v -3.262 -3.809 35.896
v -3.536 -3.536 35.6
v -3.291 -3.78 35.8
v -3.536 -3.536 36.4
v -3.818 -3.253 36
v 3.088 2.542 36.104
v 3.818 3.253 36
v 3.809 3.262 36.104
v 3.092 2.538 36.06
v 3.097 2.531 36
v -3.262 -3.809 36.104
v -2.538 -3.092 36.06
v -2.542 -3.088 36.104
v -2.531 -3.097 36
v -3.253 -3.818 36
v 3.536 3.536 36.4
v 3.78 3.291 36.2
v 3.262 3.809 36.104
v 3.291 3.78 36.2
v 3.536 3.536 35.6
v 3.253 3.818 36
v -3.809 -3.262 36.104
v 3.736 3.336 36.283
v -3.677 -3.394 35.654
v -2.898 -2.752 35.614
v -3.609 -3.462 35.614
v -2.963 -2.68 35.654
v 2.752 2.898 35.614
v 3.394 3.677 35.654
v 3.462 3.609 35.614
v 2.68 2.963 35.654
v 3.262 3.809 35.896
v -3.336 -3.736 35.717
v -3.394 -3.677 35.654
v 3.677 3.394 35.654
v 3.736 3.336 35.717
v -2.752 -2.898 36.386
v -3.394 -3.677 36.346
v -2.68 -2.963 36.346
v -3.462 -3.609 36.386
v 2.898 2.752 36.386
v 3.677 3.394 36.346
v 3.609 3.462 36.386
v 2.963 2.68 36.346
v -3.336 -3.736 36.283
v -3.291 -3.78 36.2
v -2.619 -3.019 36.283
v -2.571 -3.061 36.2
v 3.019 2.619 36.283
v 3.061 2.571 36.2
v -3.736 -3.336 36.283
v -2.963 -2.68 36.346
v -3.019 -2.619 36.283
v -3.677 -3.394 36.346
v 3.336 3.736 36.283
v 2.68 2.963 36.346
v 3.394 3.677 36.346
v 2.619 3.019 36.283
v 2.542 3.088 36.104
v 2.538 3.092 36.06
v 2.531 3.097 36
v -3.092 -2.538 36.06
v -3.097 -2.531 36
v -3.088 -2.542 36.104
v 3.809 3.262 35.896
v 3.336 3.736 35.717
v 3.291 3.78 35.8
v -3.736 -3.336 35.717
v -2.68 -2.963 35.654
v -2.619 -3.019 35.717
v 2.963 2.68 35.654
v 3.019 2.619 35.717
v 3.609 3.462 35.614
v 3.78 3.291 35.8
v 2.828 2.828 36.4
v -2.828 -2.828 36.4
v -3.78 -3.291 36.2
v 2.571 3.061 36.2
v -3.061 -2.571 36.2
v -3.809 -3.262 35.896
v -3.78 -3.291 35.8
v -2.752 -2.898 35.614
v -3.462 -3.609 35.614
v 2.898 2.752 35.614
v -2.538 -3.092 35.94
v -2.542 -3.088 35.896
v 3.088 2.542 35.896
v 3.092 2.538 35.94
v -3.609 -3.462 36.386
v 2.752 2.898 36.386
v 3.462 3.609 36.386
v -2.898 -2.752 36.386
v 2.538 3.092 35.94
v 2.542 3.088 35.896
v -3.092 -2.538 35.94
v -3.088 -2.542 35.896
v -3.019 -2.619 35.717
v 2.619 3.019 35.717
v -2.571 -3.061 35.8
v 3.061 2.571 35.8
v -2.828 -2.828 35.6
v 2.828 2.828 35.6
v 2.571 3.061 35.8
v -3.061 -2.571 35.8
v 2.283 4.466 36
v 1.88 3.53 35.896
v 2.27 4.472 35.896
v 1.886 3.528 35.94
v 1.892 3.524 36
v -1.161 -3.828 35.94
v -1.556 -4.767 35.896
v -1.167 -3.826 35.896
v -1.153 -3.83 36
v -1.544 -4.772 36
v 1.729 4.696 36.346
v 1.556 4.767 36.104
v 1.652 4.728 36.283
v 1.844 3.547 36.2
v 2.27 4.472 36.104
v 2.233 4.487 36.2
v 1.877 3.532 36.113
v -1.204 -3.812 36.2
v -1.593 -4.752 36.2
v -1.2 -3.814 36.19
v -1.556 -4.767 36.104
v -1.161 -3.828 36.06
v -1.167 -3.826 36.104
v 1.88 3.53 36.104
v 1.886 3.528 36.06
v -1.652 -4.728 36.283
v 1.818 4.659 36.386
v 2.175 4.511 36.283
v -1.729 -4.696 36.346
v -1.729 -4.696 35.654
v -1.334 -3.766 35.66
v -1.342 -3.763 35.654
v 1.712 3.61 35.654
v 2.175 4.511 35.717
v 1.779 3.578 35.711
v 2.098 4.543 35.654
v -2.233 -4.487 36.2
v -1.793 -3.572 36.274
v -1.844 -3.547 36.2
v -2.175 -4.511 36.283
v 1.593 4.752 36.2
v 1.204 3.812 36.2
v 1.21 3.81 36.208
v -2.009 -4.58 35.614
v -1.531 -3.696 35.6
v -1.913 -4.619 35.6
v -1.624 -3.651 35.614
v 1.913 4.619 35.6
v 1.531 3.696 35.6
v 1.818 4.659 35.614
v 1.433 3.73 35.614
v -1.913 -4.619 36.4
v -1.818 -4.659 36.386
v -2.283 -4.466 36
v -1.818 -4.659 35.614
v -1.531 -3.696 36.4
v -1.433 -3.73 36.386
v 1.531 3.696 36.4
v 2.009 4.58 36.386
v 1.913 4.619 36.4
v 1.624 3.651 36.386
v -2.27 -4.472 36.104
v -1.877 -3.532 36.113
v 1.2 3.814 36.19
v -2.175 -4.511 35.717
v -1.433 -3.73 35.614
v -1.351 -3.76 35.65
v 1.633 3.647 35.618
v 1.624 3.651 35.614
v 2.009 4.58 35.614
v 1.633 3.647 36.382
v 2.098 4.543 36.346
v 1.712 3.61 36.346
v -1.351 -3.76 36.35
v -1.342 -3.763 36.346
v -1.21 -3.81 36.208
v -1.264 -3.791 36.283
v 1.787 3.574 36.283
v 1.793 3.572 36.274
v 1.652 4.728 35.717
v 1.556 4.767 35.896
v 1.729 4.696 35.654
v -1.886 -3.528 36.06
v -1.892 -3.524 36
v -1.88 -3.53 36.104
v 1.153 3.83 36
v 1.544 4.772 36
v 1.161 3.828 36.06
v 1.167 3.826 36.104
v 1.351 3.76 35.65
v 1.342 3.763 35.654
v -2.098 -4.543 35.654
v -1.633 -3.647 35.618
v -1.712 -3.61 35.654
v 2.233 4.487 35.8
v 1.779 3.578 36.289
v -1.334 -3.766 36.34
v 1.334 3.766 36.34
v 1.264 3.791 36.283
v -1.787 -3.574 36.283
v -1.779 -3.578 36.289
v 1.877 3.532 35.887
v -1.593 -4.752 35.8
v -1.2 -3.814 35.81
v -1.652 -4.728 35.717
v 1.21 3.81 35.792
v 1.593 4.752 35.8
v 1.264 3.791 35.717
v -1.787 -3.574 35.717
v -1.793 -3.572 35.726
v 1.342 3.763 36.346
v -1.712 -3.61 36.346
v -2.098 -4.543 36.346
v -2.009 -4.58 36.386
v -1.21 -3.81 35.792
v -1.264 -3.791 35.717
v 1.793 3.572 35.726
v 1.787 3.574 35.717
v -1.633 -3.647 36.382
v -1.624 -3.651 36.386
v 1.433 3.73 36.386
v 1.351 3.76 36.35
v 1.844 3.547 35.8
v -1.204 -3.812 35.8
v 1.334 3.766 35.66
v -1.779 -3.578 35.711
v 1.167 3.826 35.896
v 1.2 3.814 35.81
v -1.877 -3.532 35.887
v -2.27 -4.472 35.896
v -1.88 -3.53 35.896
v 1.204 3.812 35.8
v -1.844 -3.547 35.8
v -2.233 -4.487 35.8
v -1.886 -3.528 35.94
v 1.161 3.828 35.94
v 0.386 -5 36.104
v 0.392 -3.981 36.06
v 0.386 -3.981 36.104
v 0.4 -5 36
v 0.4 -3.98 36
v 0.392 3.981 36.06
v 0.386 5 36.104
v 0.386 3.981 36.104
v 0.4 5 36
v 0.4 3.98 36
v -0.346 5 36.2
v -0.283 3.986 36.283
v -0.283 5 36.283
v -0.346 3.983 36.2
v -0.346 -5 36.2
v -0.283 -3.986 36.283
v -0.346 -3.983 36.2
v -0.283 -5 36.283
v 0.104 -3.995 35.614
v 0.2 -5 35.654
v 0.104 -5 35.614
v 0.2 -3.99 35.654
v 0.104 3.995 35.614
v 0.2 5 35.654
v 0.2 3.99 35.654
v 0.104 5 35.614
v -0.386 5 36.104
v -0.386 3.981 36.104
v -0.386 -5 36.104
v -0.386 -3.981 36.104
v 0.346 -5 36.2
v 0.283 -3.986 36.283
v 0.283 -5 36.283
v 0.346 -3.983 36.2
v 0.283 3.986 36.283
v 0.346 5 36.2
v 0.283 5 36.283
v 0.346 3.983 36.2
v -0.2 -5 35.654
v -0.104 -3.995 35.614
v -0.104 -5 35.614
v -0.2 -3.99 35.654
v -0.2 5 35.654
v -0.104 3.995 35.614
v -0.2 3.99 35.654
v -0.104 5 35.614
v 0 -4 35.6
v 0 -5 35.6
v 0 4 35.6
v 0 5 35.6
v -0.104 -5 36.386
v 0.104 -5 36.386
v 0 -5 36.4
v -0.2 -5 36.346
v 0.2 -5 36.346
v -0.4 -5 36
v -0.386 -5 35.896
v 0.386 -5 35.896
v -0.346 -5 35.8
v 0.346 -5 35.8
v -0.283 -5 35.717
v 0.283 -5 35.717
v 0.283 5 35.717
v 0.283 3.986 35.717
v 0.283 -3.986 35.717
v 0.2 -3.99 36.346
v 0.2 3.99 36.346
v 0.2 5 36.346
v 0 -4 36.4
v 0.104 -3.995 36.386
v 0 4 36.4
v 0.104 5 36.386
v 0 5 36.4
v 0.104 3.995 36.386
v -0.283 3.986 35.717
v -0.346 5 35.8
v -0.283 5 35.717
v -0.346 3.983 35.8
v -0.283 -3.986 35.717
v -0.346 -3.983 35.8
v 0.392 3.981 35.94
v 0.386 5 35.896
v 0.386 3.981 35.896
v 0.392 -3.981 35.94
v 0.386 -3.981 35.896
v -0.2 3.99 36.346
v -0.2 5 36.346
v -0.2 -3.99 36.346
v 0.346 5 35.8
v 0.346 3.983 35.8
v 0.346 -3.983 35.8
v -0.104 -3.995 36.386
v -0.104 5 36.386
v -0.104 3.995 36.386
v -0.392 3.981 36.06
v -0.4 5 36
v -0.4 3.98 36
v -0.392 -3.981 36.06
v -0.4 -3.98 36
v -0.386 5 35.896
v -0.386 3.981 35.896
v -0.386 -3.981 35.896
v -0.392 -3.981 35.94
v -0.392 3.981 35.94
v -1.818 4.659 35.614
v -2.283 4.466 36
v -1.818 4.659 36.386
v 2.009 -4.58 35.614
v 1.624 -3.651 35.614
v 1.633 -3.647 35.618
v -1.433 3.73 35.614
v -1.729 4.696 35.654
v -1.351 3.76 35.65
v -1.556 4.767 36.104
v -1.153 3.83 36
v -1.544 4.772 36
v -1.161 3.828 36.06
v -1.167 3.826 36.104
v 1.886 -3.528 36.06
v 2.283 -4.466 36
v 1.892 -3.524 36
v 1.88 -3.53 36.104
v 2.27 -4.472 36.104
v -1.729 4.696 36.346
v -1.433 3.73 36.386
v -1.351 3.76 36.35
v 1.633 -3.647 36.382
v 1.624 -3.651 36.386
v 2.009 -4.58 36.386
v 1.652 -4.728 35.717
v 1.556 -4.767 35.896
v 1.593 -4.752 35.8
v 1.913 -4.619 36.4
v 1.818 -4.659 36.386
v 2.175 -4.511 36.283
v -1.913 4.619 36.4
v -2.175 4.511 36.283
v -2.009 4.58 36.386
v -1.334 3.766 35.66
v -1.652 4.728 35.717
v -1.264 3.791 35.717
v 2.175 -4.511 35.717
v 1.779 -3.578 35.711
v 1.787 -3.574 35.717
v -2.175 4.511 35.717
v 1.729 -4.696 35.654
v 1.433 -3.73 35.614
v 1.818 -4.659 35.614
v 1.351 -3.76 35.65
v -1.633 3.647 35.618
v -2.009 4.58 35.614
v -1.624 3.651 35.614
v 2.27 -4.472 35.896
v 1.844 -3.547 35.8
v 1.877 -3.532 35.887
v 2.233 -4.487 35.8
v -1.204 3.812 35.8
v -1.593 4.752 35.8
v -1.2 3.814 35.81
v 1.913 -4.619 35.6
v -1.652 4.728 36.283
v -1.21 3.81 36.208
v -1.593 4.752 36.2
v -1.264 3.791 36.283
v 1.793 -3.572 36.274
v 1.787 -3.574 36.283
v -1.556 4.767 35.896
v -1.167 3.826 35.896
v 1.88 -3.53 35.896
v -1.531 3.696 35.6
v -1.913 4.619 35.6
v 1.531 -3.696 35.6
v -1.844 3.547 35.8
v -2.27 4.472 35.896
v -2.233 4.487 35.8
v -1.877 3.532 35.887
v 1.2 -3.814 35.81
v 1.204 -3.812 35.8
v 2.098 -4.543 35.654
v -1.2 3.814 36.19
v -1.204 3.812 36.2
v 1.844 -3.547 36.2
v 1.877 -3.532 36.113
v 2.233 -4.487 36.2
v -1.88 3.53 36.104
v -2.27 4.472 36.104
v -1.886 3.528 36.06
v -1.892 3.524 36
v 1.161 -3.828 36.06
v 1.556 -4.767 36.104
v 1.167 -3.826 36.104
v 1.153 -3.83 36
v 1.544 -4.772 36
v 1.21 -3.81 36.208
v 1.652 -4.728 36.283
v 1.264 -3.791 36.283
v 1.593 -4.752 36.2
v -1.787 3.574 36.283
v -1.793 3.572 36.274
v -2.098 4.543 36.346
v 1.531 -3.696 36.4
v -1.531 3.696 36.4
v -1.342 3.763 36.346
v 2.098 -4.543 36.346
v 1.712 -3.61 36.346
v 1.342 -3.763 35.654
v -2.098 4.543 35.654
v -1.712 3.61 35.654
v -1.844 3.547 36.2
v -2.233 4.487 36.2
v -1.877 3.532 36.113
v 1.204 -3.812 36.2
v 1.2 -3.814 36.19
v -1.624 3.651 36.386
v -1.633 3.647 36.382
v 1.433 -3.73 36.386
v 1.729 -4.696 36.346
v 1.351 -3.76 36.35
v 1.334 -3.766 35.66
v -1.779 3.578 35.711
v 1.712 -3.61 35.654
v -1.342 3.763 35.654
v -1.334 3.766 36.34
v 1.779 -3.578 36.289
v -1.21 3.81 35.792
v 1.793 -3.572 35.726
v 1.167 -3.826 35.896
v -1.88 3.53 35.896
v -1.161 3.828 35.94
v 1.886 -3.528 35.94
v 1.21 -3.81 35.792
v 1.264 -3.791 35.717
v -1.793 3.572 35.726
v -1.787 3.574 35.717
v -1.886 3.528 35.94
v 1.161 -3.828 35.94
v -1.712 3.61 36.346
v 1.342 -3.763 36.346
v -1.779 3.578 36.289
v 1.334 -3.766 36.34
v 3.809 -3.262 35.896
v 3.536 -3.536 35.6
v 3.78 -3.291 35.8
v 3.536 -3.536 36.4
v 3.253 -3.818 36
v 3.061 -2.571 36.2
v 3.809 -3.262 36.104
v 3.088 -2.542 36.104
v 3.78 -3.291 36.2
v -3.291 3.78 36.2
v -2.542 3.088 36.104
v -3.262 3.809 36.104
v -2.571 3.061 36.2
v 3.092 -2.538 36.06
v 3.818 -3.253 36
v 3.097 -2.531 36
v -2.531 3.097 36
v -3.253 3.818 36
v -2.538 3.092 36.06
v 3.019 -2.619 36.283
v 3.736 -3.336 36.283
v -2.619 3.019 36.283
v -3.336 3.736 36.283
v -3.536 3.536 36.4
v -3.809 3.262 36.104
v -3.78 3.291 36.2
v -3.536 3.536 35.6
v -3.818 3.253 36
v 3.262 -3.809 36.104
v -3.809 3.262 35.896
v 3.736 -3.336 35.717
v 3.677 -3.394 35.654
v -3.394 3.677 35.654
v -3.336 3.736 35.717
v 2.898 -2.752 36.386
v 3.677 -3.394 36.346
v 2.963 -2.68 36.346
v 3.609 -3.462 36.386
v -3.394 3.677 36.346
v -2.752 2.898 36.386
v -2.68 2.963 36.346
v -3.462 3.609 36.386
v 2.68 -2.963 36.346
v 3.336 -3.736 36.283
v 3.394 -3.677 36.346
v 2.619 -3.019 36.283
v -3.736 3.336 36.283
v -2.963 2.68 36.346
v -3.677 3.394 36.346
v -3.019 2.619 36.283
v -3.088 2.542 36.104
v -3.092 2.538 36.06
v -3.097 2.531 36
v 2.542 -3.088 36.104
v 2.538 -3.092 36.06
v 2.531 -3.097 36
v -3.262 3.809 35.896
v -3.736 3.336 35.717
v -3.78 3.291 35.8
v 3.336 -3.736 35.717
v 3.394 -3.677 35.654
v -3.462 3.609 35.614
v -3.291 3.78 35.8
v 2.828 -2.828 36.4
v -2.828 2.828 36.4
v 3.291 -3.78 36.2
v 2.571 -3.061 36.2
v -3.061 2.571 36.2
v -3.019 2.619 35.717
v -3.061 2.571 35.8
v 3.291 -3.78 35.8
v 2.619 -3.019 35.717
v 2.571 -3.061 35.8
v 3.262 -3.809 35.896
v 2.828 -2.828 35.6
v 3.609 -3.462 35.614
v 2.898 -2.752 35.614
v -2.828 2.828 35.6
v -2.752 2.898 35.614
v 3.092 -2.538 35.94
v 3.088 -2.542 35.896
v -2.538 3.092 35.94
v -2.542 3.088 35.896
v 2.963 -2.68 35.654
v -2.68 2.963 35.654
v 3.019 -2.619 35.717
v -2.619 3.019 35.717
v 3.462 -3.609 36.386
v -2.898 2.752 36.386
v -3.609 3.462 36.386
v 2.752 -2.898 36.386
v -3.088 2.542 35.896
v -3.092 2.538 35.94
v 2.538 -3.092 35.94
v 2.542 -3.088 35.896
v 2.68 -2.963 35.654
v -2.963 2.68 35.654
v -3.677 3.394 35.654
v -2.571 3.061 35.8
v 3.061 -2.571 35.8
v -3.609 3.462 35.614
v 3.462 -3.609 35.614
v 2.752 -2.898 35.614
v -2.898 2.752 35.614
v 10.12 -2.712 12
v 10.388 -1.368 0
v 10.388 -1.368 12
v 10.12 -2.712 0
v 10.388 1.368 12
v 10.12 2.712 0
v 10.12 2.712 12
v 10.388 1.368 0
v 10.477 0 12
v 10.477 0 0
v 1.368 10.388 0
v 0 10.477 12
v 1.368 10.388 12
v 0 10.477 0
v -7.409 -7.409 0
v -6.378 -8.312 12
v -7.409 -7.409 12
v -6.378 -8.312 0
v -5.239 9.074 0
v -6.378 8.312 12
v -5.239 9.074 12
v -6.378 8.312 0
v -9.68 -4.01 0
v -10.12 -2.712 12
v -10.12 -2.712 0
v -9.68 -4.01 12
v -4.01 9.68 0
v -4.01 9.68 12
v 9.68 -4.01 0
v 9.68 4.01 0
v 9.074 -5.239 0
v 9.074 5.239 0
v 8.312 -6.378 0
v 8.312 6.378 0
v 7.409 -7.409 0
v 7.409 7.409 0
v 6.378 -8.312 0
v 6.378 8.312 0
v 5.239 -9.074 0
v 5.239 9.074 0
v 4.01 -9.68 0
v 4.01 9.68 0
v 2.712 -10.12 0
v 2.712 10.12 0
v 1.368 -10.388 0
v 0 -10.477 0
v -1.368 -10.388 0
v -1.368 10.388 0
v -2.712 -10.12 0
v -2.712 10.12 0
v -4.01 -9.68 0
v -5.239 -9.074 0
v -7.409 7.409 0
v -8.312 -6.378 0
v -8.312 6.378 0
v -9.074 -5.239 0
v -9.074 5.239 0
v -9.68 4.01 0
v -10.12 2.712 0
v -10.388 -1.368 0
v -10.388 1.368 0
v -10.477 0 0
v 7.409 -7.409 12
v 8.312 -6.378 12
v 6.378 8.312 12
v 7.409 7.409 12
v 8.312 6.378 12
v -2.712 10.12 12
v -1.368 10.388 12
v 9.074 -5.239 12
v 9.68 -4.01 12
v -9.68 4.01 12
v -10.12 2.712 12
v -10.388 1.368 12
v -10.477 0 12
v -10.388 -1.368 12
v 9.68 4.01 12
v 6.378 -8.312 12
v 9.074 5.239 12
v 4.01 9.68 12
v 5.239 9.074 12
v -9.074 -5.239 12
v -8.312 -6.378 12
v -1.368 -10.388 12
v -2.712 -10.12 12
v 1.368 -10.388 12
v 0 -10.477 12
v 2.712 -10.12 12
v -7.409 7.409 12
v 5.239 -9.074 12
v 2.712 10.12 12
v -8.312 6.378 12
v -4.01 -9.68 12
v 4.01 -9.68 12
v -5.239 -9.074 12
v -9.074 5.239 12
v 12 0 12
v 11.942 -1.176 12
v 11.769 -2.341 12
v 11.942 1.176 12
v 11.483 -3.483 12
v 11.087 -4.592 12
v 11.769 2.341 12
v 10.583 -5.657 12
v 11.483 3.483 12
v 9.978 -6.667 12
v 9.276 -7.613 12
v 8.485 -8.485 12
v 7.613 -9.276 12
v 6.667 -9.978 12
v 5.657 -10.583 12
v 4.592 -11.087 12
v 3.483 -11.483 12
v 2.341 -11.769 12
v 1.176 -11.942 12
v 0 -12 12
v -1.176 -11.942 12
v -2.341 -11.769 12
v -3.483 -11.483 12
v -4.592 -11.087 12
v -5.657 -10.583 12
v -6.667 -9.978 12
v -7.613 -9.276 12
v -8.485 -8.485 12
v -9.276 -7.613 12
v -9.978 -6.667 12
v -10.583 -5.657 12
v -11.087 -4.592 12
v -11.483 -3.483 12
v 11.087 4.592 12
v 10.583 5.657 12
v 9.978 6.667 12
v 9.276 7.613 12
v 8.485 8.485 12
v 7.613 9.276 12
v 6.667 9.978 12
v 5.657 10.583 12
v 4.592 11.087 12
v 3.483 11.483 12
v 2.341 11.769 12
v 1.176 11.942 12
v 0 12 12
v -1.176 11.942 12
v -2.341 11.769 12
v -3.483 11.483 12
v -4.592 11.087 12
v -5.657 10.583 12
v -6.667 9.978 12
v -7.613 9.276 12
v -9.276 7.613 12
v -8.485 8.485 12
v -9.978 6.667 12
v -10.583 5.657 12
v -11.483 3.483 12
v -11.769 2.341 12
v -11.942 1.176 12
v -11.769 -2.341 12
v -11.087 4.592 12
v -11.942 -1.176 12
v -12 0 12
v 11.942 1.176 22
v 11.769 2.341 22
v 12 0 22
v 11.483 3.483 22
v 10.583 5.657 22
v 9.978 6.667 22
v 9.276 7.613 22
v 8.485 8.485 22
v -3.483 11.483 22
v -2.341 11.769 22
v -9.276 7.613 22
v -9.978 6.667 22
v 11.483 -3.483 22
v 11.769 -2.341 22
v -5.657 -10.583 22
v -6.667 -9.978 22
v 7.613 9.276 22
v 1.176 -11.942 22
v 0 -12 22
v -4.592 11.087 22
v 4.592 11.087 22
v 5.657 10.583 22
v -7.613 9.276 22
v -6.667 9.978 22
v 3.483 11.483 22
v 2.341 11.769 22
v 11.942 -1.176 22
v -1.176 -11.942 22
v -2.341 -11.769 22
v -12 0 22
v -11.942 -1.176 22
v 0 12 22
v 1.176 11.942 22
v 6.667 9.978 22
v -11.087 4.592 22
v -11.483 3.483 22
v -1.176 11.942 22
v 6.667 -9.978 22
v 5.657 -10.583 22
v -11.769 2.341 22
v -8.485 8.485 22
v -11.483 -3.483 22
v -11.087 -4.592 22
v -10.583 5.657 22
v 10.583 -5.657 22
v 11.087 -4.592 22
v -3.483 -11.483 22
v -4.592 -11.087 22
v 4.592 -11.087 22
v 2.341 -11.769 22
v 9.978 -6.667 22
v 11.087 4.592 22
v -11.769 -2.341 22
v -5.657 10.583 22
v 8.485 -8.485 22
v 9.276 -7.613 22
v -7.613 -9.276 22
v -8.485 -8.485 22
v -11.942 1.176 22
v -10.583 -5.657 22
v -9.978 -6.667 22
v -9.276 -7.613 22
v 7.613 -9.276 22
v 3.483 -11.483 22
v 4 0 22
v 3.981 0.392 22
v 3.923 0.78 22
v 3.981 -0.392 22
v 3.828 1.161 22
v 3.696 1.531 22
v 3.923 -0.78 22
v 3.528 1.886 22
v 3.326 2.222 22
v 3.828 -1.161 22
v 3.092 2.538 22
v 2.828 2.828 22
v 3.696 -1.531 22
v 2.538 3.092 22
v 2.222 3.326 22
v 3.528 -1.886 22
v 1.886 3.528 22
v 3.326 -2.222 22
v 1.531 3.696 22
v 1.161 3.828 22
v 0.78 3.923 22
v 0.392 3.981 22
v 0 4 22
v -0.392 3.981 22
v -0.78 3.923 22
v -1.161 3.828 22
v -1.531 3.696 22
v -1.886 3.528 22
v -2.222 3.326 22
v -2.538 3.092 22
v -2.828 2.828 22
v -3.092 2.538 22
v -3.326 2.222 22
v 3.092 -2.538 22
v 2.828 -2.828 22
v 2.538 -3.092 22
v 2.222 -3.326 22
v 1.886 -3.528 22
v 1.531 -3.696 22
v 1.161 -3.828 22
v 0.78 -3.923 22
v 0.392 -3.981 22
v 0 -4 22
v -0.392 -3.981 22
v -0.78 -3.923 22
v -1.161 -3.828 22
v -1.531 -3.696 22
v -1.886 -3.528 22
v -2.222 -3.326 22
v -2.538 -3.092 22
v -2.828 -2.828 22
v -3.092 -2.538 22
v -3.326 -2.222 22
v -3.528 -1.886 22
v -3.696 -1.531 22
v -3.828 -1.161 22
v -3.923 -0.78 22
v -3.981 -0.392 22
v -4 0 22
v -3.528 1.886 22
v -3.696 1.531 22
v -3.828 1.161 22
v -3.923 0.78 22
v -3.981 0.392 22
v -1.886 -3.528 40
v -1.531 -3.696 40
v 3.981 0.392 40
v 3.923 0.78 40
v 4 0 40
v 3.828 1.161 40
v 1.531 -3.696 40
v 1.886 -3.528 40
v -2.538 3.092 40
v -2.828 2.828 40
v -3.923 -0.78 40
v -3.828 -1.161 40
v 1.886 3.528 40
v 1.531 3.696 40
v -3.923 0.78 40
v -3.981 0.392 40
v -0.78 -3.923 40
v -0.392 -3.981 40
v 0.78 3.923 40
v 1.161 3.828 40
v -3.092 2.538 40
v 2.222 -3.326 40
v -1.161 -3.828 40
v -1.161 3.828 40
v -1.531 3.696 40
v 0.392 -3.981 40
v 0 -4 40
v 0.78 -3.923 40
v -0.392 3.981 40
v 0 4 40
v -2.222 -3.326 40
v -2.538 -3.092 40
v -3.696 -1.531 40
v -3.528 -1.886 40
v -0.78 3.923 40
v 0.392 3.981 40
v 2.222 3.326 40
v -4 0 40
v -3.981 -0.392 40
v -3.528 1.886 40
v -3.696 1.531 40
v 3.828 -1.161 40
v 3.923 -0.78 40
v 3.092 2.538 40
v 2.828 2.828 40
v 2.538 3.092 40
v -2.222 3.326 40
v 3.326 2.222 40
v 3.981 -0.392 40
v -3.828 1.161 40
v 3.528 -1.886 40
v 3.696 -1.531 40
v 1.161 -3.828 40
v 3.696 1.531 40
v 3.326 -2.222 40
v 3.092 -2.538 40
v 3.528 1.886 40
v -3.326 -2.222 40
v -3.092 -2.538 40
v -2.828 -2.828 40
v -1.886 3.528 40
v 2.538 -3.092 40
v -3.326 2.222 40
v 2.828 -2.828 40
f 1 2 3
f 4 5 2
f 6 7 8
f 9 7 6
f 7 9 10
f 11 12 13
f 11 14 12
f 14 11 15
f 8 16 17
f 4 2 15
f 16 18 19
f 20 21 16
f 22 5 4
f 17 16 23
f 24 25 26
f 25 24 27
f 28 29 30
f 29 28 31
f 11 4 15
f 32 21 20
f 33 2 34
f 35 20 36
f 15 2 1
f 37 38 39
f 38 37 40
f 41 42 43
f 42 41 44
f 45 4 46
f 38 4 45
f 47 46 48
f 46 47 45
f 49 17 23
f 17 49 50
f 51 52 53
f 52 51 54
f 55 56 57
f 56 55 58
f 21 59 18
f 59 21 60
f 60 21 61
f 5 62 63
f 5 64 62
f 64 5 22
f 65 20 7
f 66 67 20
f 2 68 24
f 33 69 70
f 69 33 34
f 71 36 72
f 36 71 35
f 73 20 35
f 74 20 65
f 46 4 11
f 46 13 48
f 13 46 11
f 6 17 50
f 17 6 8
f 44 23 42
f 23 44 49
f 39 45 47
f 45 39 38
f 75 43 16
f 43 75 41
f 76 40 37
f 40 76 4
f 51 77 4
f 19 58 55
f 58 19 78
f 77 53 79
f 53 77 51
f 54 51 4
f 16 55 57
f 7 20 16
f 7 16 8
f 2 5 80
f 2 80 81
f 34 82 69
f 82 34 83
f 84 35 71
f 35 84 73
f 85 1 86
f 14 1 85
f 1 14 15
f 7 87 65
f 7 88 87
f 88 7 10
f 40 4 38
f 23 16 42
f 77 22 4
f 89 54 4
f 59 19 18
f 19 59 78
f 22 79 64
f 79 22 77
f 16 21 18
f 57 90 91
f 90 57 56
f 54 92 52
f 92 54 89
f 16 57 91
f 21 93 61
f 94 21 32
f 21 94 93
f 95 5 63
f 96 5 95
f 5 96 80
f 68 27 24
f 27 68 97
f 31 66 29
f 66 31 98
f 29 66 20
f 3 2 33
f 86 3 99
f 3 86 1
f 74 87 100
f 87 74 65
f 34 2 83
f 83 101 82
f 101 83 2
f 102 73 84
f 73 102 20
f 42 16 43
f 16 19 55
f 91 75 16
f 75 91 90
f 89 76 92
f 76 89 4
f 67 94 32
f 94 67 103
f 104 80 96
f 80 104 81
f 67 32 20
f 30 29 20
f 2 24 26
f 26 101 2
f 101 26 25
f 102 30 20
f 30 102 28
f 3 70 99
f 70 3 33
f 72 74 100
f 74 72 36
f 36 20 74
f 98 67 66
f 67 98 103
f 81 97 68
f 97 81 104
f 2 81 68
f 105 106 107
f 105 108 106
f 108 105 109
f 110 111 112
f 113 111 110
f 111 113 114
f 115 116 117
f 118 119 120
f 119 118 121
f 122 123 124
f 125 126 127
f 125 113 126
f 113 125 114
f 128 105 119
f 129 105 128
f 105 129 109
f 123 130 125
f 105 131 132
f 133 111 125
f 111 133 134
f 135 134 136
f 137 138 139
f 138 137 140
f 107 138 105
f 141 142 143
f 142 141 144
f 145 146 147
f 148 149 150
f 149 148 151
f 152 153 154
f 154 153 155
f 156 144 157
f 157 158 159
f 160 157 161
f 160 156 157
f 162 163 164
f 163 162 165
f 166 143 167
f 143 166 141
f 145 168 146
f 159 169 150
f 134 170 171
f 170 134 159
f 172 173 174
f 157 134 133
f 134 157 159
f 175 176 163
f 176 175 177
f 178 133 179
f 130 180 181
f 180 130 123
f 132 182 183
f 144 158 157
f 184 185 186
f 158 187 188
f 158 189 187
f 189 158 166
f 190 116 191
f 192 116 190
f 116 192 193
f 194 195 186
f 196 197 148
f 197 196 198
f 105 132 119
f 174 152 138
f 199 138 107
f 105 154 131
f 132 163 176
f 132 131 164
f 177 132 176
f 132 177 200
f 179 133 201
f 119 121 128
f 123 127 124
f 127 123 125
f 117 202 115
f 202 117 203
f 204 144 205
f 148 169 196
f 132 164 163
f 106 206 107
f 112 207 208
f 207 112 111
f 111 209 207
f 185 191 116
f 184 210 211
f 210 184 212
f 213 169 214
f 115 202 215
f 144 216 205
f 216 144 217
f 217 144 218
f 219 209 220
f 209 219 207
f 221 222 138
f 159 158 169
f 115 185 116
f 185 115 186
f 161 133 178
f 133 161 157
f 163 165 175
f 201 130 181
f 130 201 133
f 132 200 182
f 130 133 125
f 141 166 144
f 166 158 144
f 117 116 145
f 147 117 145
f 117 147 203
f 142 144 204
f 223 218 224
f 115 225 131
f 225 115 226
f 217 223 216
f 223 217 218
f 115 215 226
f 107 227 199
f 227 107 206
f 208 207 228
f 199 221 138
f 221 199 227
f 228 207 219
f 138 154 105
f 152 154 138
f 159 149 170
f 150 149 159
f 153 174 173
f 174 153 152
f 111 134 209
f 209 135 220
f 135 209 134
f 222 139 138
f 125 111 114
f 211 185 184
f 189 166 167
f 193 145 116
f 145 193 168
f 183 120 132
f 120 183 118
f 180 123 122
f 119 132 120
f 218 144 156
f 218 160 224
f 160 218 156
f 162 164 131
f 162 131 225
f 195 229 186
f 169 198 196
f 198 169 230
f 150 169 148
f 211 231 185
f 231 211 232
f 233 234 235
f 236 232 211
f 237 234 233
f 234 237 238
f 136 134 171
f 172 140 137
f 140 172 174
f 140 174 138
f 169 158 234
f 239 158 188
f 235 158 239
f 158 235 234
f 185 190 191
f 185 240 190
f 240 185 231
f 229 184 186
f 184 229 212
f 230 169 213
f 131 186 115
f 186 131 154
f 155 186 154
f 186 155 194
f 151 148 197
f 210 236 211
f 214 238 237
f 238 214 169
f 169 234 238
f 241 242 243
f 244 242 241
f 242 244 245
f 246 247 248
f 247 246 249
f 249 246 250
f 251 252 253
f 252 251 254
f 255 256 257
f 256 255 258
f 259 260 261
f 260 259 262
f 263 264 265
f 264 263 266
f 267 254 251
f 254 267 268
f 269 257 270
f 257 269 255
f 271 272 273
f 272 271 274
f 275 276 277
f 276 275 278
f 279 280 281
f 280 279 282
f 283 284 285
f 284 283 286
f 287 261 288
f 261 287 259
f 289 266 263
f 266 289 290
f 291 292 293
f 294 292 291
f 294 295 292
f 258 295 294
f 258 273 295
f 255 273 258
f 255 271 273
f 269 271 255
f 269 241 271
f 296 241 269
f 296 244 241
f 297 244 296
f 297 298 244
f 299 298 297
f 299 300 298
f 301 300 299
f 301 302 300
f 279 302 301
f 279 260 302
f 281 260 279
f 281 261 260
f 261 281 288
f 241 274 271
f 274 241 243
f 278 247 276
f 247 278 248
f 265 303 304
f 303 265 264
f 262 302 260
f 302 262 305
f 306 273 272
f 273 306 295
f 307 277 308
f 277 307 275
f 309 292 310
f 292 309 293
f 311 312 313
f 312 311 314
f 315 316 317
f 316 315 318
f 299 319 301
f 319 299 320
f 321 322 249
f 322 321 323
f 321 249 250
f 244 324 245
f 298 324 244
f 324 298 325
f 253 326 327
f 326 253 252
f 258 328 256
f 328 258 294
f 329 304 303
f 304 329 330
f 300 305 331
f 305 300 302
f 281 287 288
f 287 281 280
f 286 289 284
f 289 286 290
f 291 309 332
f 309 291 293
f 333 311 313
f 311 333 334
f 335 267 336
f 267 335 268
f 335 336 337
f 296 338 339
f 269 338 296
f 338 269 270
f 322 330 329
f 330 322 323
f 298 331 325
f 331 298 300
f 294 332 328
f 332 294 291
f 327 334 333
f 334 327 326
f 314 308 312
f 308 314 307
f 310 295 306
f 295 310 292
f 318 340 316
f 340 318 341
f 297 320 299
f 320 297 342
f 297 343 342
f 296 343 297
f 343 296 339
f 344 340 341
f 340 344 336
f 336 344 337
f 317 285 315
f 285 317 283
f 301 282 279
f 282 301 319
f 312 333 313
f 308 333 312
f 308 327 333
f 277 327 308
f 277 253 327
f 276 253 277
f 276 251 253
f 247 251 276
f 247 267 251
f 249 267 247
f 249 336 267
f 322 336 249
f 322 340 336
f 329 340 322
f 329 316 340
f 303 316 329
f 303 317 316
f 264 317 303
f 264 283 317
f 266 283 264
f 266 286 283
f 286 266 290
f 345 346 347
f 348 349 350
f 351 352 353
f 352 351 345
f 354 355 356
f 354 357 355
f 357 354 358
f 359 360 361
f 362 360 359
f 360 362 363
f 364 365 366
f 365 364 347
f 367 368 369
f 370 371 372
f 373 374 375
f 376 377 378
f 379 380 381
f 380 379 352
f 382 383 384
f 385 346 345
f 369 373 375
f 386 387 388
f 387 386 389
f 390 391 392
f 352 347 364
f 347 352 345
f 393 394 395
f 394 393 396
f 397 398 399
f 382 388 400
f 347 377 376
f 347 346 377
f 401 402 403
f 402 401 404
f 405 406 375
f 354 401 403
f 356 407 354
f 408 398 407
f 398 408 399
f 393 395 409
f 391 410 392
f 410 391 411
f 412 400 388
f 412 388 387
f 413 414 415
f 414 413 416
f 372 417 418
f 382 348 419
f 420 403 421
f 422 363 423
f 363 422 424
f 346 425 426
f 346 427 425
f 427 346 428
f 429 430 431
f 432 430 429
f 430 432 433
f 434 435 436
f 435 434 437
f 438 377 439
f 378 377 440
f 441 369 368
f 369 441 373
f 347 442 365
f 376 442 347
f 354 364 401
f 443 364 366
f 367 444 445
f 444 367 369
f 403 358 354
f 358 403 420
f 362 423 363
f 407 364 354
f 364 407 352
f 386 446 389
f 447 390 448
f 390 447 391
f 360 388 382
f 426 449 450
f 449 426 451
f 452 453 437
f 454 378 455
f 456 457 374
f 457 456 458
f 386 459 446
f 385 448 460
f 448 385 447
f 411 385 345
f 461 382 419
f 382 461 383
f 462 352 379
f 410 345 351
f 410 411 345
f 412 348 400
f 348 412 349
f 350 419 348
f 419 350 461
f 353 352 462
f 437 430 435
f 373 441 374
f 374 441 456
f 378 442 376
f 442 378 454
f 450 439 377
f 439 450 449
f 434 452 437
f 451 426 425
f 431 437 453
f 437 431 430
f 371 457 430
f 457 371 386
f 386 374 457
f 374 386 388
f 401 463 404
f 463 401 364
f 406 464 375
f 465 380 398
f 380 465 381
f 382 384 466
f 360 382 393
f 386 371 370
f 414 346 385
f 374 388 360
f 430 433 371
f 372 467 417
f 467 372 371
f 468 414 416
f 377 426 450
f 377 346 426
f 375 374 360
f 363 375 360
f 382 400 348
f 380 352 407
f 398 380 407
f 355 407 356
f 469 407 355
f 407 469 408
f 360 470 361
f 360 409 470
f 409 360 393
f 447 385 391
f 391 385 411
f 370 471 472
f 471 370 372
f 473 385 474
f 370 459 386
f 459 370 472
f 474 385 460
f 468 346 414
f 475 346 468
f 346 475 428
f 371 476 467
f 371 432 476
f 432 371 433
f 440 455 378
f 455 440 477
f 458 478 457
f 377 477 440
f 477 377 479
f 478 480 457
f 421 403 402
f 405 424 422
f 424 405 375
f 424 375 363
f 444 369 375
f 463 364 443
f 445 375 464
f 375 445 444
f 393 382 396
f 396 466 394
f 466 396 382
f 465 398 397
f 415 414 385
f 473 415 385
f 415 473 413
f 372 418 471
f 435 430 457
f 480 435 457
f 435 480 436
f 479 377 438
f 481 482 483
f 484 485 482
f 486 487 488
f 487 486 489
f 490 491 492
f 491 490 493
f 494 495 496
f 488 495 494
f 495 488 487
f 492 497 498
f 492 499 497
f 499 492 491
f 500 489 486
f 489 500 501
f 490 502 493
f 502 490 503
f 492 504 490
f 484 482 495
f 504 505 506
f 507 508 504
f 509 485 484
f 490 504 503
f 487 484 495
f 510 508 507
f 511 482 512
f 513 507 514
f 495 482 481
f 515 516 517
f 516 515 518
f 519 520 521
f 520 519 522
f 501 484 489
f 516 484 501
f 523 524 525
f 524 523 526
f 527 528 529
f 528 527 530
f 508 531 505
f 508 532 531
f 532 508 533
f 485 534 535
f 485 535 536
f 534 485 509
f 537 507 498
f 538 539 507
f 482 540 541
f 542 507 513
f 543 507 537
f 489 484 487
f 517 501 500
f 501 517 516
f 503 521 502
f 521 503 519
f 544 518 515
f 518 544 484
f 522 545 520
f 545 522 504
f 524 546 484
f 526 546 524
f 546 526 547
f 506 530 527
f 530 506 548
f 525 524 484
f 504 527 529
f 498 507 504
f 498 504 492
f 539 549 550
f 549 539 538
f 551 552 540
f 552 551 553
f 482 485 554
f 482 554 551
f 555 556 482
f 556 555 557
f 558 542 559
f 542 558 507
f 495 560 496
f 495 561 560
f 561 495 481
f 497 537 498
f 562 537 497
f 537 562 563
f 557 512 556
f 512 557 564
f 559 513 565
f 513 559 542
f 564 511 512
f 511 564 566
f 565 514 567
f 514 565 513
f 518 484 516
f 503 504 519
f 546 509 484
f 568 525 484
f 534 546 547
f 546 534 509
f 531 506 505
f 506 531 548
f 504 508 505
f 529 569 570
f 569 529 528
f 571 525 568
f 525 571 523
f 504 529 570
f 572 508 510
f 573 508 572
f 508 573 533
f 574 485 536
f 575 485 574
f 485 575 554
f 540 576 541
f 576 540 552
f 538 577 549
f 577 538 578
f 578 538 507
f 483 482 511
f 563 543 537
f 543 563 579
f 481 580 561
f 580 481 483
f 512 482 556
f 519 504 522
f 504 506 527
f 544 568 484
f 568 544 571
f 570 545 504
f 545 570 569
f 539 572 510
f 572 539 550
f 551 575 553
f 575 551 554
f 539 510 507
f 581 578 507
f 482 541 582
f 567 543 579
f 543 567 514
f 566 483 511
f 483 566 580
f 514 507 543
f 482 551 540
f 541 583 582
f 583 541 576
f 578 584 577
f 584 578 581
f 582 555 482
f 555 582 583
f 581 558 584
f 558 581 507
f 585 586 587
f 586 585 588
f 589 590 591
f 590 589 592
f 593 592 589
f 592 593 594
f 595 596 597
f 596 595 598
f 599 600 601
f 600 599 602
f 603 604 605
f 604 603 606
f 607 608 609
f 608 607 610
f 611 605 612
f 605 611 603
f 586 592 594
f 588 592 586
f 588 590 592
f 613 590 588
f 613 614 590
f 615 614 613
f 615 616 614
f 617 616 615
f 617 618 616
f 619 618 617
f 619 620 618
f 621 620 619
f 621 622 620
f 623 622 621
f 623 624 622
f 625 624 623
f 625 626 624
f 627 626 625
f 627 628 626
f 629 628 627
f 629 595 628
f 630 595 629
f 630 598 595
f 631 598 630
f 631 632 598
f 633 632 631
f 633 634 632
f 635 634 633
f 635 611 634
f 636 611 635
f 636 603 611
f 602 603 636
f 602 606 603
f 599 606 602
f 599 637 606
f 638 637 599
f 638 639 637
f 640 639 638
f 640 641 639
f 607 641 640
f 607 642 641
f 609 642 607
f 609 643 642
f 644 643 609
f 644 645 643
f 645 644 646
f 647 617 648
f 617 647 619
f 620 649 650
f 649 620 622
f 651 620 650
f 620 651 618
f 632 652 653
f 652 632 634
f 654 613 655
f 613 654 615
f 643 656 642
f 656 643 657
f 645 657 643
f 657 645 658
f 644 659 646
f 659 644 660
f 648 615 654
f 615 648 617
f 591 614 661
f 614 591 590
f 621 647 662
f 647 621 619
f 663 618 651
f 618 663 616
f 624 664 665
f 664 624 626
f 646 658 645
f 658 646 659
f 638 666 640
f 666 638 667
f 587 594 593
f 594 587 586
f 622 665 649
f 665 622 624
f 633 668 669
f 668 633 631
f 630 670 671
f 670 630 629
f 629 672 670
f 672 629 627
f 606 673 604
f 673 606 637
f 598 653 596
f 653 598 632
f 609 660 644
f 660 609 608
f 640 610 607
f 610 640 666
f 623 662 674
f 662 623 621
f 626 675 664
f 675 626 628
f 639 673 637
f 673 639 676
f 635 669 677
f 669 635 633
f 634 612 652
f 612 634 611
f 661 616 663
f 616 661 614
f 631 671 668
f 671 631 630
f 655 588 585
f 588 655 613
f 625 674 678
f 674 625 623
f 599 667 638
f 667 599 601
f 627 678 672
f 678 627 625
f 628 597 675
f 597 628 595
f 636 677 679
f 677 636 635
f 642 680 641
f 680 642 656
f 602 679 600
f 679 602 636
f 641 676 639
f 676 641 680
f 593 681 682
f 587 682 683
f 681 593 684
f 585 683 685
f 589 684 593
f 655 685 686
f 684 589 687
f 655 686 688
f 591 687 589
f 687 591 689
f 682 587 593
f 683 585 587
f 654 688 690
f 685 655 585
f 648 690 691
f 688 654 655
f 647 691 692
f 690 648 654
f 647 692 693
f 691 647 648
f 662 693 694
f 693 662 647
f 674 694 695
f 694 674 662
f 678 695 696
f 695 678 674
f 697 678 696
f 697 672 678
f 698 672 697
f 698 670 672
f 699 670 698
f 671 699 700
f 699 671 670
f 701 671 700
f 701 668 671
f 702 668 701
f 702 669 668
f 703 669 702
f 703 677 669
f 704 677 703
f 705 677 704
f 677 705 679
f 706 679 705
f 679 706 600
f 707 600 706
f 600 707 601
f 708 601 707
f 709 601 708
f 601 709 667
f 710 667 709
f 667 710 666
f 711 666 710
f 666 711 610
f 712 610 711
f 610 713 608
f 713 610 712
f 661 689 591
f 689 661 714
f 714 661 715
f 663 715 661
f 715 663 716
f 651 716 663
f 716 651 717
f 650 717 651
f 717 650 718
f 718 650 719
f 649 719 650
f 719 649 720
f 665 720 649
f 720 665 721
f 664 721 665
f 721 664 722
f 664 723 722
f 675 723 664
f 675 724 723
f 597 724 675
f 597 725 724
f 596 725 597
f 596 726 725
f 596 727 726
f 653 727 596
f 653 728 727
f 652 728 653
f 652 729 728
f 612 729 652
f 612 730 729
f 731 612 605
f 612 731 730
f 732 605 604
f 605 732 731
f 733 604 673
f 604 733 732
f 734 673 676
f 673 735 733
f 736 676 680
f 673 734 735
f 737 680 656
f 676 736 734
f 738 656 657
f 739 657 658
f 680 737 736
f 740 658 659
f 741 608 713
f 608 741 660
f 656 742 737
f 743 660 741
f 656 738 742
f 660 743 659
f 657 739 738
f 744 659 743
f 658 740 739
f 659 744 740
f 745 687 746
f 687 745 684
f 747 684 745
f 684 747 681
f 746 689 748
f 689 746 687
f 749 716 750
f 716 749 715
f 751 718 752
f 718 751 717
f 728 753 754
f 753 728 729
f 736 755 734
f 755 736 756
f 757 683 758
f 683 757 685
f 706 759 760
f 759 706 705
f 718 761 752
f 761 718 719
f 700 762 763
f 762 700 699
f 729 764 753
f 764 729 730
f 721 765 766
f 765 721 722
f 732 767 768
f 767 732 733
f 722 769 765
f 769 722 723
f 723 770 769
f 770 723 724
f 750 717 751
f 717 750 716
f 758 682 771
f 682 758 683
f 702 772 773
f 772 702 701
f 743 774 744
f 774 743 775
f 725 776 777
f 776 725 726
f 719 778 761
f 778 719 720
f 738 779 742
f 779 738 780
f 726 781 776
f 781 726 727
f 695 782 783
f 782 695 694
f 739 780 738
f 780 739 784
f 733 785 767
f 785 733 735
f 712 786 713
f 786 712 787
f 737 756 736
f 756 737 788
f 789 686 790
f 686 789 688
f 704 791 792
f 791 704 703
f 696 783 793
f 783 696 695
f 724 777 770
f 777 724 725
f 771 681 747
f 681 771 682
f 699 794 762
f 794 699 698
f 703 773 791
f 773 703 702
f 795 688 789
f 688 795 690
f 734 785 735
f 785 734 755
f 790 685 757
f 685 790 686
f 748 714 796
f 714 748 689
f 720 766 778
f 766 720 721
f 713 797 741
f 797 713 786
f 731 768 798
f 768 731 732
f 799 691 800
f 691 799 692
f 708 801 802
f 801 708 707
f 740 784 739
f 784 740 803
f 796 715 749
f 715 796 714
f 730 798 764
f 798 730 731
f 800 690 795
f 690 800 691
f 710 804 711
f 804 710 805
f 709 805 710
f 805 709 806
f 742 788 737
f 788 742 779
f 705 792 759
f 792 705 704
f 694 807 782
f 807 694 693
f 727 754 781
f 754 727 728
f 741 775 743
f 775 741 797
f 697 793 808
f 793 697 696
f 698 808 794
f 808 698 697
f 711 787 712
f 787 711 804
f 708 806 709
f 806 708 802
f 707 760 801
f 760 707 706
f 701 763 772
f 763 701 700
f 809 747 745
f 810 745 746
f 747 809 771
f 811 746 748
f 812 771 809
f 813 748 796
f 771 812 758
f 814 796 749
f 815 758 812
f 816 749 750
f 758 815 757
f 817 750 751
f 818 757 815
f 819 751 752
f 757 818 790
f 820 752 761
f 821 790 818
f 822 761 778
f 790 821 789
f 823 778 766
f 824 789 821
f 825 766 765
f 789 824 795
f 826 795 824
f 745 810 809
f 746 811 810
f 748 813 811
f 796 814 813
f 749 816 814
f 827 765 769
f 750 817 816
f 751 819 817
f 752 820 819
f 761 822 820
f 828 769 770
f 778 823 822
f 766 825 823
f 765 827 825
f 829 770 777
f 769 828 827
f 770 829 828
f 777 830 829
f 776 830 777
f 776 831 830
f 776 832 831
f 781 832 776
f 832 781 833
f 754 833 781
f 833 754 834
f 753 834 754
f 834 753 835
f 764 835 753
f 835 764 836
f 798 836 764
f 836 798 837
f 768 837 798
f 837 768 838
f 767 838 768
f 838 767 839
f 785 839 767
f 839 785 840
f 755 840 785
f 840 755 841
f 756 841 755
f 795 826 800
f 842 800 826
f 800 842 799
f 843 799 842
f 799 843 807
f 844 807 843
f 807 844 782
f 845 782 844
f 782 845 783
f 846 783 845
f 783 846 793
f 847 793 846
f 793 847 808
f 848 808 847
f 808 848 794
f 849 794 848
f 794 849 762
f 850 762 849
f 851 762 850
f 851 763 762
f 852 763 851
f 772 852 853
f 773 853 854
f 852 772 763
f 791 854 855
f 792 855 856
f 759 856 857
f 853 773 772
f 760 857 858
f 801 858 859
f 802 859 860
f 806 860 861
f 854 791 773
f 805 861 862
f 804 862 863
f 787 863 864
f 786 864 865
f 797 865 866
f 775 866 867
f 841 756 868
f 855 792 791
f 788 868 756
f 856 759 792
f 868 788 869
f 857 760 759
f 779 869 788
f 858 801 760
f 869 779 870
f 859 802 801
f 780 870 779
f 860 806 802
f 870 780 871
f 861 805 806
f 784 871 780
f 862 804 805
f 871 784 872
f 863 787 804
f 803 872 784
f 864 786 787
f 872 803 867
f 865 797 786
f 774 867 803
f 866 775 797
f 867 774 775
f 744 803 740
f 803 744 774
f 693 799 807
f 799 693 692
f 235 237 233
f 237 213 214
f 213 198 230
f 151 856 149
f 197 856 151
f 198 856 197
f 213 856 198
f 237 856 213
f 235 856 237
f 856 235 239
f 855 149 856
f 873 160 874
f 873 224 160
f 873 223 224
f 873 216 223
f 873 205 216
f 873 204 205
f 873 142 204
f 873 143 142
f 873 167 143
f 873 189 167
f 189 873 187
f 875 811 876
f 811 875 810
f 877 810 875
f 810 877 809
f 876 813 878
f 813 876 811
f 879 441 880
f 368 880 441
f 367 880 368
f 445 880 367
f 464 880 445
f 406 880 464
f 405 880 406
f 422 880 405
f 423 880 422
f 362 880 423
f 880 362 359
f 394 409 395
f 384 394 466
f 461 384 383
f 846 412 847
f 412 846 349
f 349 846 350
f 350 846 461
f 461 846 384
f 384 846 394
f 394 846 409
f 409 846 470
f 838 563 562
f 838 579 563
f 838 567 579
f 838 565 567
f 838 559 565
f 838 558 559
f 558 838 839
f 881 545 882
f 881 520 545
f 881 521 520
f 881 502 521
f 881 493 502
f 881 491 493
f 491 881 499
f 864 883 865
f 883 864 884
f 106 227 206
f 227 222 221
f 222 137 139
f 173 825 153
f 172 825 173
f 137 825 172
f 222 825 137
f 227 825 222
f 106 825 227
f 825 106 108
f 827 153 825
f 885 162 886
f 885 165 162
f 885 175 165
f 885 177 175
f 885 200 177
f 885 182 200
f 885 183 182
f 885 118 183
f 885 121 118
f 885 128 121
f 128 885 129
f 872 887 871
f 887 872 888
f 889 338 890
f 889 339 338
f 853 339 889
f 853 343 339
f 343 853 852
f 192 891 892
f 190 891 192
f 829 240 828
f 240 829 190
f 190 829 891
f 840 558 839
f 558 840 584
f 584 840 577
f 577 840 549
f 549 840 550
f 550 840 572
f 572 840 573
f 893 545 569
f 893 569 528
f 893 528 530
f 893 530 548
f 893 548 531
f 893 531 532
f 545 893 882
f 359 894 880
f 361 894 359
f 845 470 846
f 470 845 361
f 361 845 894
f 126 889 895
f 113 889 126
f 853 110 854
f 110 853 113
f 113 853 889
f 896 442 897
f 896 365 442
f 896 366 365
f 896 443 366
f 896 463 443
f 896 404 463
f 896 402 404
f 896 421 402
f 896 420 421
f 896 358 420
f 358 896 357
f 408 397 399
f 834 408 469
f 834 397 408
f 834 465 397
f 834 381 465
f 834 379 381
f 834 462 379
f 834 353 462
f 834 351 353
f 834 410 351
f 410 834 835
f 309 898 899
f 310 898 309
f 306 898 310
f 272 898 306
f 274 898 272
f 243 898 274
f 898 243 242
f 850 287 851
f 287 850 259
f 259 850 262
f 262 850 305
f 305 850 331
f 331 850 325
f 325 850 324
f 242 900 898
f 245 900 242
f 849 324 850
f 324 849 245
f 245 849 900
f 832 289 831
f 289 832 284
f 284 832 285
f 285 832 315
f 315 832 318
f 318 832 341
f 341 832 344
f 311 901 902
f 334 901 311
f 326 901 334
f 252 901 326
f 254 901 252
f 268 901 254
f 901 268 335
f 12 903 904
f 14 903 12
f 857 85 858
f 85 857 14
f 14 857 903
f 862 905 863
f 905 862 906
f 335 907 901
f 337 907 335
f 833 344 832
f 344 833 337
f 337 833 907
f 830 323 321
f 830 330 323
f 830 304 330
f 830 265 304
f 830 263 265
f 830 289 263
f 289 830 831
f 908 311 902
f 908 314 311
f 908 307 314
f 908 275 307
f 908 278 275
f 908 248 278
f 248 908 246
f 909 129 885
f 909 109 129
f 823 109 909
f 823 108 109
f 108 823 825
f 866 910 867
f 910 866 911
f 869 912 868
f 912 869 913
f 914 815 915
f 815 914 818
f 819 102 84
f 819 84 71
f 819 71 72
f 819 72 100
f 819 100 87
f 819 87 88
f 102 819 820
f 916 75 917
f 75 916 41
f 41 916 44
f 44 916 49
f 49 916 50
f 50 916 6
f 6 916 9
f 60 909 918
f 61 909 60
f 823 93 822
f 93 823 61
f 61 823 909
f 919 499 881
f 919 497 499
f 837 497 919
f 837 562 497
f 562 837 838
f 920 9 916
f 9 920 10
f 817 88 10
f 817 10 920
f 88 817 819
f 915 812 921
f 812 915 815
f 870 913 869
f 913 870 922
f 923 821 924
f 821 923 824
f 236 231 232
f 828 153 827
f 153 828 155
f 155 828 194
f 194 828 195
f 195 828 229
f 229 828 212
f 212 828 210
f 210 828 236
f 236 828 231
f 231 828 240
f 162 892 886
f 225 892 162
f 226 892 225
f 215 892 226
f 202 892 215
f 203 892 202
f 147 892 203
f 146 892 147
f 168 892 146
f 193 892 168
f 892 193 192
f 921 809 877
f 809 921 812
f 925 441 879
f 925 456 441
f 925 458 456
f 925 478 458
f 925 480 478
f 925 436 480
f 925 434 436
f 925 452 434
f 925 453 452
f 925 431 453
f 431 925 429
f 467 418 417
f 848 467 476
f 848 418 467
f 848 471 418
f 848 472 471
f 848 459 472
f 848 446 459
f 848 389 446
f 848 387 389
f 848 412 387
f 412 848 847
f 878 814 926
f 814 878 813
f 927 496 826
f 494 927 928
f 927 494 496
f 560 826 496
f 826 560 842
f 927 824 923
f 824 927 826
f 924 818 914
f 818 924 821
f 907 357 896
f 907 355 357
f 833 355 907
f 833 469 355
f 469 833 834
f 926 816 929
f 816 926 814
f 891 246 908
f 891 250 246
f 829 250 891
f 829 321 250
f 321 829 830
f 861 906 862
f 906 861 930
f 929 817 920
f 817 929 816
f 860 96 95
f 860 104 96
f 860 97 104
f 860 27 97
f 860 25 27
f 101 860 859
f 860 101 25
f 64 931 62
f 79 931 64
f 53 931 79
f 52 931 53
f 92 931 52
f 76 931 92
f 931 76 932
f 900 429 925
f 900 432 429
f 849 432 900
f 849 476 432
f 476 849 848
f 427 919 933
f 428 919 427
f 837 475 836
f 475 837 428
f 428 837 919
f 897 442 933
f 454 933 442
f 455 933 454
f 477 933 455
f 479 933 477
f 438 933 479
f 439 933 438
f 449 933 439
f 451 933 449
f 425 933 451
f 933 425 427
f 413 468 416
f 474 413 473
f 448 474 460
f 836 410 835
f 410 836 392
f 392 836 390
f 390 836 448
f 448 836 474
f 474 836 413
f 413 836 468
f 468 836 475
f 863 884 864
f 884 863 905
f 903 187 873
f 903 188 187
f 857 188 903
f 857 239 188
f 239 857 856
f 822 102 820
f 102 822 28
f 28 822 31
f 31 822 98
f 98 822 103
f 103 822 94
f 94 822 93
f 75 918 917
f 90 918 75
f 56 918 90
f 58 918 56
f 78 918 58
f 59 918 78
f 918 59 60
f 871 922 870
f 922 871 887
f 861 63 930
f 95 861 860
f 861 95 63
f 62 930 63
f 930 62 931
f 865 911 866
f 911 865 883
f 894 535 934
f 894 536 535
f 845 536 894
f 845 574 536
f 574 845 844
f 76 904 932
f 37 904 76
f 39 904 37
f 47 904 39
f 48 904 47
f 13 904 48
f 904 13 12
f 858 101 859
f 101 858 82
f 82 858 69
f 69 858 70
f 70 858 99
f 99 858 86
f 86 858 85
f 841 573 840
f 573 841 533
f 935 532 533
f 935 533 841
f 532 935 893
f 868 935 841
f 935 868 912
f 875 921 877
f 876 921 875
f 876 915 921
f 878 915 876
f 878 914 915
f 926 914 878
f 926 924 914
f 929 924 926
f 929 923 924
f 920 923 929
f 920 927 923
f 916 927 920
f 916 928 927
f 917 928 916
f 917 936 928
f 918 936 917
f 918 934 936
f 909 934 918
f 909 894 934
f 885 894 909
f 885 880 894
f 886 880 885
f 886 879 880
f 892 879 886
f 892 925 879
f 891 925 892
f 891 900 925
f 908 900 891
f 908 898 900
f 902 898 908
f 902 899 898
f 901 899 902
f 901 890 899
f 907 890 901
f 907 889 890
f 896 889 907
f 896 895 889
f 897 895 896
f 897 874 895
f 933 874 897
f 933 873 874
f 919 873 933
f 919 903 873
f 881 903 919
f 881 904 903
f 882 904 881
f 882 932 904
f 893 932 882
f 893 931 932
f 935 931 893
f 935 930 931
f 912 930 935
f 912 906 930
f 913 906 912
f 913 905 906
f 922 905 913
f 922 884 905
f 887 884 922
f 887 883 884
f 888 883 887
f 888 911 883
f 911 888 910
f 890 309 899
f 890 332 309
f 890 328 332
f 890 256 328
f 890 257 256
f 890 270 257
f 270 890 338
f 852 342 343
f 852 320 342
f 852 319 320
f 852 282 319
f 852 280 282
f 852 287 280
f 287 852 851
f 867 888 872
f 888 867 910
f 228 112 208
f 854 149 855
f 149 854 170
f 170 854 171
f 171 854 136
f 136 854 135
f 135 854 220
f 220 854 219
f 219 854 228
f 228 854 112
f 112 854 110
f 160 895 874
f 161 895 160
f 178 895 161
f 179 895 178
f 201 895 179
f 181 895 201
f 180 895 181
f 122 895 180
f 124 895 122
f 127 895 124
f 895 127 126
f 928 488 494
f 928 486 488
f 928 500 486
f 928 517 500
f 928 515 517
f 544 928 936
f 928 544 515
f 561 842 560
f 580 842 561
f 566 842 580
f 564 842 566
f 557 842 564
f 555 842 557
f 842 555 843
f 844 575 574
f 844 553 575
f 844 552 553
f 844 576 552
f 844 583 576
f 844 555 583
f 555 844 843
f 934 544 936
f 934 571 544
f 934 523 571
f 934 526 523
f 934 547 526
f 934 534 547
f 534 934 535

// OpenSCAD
// Parametric irrigation sprinkler nozzle for the garden-automation robot.
// Screws onto a standard 1/2" BSP irrigation riser and distributes water in a fan.
// Issue #76 task: Irrigazione programmata.
// Print in PETG or rigid PVC; verify water flow before connecting the supply.

// Parameters (mm)
base_dia = 24;            // base flange diameter
base_height = 10;        // base flange height
thread_od = 20.955;      // 1/2" BSP external thread approx OD
thread_height = 12;      // threaded riser length
nozzle_dia = 8;          // nozzle body diameter
nozzle_height = 18;      // nozzle body height
fan_slots = 5;           // number of fan spray slots
fan_slot_w = 0.8;        // width of each fan slot
fan_slot_h = 4;          // height of each fan slot
fan_arc = 90;            // total fan spread in degrees

$fn = 64;

module sprinkler_nozzle() {
  // threaded base riser
  cylinder(h = thread_height, d = thread_od, $fn = 48);
  // flange
  translate([0, 0, thread_height])
    cylinder(h = base_height, d = base_dia);
  // nozzle body
  translate([0, 0, thread_height + base_height])
    cylinder(h = nozzle_height, d = nozzle_dia);
  // fan spray slots cut into the nozzle top
  translate([0, 0, thread_height + base_height + nozzle_height - fan_slot_h])
    for (i = [0 : fan_slots - 1]) {
      angle = -fan_arc / 2 + (fan_arc / (fan_slots - 1)) * i;
      rotate([90, 0, angle])
        translate([0, 0, -nozzle_dia / 2 - 1])
          cylinder(h = nozzle_dia + 2, d = fan_slot_w, $fn = 24);
    }
}

sprinkler_nozzle();
// Tune fan_slots and fan_arc for the desired spray width and droplet size.
